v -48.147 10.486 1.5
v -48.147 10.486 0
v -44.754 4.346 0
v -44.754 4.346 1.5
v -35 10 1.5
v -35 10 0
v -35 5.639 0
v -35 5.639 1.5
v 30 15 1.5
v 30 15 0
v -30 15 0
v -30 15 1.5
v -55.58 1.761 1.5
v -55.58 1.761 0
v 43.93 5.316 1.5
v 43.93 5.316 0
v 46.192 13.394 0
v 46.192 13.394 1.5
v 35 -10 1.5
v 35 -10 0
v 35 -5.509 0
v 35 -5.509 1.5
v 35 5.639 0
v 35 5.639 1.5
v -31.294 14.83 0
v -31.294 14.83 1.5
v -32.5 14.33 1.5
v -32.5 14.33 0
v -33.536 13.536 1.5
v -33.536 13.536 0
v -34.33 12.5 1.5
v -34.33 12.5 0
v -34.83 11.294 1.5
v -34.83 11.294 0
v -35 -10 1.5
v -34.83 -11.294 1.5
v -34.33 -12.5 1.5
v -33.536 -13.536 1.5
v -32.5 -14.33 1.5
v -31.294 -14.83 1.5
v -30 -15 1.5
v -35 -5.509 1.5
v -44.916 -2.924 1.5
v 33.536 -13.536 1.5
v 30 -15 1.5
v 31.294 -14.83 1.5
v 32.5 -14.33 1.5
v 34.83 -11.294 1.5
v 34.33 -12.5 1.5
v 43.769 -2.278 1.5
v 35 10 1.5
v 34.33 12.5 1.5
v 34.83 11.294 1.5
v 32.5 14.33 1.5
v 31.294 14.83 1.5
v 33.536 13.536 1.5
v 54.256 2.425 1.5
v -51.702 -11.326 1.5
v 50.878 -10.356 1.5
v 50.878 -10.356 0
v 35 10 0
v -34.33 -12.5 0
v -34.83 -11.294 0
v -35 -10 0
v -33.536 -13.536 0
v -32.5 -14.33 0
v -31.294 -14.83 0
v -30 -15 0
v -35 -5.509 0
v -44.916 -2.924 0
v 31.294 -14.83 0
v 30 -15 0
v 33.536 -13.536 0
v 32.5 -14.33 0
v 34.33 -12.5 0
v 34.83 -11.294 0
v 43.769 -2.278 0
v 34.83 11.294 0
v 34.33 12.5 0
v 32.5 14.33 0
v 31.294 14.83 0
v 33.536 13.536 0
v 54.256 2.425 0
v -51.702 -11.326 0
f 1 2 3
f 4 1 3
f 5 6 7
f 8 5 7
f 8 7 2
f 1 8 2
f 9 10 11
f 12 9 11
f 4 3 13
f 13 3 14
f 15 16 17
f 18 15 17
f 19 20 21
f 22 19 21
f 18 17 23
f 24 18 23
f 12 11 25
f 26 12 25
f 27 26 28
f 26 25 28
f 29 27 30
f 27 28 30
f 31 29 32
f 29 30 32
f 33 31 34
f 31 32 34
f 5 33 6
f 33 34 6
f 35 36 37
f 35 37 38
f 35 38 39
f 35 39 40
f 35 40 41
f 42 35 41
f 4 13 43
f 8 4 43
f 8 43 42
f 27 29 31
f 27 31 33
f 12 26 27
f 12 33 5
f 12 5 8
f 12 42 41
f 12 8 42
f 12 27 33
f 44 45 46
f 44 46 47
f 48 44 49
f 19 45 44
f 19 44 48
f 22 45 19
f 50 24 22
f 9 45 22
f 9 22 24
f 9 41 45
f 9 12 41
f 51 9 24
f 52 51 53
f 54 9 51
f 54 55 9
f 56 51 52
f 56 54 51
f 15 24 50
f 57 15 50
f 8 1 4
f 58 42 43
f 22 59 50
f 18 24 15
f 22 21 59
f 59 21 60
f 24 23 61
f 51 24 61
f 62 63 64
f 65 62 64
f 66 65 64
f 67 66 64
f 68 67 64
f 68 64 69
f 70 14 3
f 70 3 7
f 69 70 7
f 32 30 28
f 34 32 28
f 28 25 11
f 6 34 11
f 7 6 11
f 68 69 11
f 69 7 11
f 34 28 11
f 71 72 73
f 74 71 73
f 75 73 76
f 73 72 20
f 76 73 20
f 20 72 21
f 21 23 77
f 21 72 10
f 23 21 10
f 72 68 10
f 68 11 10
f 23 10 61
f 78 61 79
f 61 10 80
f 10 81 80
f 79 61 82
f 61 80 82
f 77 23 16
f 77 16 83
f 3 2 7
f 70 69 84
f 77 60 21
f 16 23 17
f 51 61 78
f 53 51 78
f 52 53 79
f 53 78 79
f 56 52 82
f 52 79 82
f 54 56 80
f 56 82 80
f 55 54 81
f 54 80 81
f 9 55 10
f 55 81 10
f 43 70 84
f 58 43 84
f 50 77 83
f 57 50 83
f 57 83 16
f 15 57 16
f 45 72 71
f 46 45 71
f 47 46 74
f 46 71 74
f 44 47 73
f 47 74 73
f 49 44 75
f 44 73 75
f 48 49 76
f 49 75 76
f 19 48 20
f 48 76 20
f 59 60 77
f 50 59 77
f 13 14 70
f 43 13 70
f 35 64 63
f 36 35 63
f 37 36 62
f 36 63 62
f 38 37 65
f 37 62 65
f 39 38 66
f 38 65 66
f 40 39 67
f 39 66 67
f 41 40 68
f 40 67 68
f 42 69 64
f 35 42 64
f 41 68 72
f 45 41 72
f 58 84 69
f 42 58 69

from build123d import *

# Parameters (mm, degrees)
F1_DEPTH = 1.5


with BuildPart() as f1:
    # F0 (on Top) → F1 (new body)
    with BuildSketch(Plane.XY):
        with BuildLine():
            Line((30, 15), (-30, 15))
            ThreePointArc((-30, 15), (-33.535534, 13.535534), (-35, 10))
            Line((-35, 10), (-35, 5.638967))
            Line((-35, 5.638967), (-35, -5.509344))
            Line((-35, -5.509344), (-35, -10))
            ThreePointArc((-35, -10), (-33.535534, -13.535534), (-30, -15))
            Line((-30, -15), (30, -15))
            ThreePointArc((30, -15), (33.535534, -13.535534), (35, -10))
            Line((35, -10), (35, -5.509344))
            Line((35, -5.509344), (35, 5.638967))
            Line((35, 5.638967), (35, 10))
            ThreePointArc((35, 10), (33.535534, 13.535534), (30, 15))
        make_face()
        Polygon((-35, -5.509344), (-35, 5.638967), (-48.147307, 10.48606), (-44.754342, 4.34641), (-55.579518, 1.761294), (-44.915912, -2.924228), (-51.701845, -11.325855), align=None)
        Polygon((46.192096, 13.394315), (35, 5.638967), (35, -5.509344), (50.877613, -10.356436), (43.768549, -2.277949), (54.255958, 2.424591), (43.930118, 5.315828), align=None)
    extrude(amount=F1_DEPTH)


solid = f1.part
